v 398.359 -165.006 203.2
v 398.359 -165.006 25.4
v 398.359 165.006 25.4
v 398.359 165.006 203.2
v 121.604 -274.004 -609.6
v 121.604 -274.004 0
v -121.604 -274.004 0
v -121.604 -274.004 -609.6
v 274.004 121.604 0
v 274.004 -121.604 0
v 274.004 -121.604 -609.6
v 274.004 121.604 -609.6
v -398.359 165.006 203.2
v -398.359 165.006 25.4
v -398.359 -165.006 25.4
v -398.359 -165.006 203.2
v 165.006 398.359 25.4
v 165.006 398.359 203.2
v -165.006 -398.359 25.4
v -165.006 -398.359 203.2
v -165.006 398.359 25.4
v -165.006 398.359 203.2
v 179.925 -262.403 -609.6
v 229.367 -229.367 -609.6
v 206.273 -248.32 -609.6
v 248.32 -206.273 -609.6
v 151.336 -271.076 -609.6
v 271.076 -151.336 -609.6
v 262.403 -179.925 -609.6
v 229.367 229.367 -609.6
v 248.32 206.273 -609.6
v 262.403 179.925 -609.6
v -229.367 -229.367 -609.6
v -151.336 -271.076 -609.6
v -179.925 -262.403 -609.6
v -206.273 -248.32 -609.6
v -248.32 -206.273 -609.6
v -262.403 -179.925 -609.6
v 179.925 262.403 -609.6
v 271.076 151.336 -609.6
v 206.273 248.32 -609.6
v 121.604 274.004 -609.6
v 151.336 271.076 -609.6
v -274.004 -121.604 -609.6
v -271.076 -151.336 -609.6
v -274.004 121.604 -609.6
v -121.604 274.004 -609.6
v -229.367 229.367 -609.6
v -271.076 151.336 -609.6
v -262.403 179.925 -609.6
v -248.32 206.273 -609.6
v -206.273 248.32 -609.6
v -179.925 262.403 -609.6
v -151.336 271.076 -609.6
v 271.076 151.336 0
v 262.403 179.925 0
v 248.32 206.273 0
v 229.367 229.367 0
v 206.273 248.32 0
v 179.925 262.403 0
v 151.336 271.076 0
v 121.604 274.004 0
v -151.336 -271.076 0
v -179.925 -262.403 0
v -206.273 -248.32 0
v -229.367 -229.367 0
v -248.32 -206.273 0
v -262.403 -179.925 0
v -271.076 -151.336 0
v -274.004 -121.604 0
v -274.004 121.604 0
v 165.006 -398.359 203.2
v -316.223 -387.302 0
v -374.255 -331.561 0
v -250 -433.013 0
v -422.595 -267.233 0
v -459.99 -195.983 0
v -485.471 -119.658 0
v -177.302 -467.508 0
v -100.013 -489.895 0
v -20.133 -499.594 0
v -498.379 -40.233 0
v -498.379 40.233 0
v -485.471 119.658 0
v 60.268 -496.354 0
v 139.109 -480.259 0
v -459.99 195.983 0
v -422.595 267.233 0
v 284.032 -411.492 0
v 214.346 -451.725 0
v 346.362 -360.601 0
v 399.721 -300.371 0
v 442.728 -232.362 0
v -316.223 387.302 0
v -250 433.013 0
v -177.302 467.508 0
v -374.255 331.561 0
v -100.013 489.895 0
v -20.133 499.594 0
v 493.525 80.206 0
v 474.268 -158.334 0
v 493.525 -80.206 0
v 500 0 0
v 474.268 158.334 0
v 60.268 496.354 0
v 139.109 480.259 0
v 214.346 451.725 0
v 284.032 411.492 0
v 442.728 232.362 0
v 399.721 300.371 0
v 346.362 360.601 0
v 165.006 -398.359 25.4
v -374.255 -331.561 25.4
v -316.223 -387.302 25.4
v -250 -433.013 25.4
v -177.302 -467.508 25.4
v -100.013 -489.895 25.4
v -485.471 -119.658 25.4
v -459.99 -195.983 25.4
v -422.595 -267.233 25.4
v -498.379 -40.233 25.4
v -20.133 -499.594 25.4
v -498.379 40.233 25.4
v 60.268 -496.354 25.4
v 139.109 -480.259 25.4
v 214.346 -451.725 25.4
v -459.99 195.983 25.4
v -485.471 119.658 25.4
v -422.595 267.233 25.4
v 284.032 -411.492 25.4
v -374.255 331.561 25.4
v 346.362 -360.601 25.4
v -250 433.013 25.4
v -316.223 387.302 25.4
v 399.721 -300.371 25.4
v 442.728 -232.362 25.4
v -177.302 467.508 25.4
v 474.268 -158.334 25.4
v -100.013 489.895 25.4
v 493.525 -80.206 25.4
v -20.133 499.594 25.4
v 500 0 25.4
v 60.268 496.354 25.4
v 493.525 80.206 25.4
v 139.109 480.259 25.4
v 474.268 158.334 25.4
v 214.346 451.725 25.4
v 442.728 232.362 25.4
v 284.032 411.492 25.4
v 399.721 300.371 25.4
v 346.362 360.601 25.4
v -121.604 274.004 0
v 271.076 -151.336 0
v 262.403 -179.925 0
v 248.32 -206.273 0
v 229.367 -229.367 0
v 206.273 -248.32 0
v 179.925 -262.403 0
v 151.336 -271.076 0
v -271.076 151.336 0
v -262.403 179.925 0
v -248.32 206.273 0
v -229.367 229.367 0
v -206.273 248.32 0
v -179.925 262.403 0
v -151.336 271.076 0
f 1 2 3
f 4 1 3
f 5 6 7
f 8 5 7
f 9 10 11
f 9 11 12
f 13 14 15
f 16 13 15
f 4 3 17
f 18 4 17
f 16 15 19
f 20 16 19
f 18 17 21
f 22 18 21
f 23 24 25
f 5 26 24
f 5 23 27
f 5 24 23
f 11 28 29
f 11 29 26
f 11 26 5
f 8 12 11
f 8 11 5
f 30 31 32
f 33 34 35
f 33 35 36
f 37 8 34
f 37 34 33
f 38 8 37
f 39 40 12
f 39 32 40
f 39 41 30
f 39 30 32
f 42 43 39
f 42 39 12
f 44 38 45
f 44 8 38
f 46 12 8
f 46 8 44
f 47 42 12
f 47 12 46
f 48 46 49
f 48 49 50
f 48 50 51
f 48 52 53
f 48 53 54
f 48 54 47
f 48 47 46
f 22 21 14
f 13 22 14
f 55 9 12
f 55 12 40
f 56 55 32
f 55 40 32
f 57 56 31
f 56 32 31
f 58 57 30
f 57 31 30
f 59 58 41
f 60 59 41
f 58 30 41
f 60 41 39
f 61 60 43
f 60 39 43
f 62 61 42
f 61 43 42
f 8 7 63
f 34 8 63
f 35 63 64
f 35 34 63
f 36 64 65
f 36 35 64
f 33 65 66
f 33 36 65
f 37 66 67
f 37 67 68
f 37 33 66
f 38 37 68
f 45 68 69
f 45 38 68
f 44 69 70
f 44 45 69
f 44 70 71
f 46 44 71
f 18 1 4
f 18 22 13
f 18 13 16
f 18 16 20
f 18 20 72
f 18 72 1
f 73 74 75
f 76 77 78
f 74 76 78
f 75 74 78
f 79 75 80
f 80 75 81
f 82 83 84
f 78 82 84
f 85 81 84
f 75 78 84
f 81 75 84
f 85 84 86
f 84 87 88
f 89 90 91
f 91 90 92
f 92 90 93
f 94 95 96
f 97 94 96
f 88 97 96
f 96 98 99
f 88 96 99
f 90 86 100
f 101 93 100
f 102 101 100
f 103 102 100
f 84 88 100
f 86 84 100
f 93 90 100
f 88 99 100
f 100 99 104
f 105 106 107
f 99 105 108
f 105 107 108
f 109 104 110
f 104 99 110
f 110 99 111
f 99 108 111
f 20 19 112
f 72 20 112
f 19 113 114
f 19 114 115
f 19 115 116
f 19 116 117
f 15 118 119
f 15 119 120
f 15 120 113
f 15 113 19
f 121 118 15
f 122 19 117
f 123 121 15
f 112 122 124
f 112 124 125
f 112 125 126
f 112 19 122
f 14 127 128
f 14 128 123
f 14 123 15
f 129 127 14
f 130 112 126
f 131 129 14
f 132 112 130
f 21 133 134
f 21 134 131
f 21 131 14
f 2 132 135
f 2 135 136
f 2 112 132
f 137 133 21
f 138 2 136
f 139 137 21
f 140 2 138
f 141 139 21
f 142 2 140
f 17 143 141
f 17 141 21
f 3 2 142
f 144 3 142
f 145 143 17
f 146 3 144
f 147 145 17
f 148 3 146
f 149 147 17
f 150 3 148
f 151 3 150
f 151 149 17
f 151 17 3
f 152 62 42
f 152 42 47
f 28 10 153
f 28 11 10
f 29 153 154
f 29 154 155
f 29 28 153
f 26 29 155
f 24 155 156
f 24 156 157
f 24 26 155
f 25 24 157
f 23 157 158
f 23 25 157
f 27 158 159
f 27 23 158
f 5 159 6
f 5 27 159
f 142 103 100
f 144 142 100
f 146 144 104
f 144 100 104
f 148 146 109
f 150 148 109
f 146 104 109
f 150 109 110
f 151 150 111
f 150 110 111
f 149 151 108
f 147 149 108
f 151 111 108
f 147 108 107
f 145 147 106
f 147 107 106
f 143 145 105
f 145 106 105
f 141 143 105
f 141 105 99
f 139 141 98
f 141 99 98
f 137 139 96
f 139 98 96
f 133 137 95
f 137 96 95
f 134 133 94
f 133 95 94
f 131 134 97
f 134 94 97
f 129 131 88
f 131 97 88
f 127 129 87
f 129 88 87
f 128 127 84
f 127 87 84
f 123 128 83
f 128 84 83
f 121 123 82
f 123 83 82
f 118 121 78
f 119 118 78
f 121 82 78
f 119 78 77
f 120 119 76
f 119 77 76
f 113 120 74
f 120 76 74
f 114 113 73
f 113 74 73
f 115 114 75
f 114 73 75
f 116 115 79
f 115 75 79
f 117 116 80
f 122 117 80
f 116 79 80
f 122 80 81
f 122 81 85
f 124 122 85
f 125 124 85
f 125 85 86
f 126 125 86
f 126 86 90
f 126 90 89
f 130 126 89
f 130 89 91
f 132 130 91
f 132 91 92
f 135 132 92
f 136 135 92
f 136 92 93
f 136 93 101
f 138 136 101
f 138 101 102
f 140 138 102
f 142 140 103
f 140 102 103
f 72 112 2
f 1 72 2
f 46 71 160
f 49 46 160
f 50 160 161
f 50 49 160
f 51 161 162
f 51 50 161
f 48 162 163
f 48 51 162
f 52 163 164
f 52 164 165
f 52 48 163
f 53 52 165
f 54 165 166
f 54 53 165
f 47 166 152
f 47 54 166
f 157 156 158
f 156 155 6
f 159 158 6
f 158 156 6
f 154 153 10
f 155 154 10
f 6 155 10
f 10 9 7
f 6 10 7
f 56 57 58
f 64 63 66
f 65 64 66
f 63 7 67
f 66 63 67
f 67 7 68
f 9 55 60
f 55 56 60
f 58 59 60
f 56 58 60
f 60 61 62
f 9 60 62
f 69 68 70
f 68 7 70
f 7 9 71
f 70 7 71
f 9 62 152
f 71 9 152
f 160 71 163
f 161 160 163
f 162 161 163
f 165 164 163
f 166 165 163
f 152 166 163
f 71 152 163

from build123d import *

# Parameters (mm, degrees)
BOSS_EXTRUDE1_DEPTH = 203.2
SKETCH1_3_R         = 500
BOSS_EXTRUDE2_DEPTH = 25.4
SKETCH2_W           = 548.008149558
SKETCH2_H           = 548.008149558
BOSS_EXTRUDE3_DEPTH = 609.6
FILLET1_R           = 152.4


with BuildPart() as part:
    # Sketch1 → Boss-Extrude1 (new body)
    with BuildSketch(Plane.XY):
        Polygon((398.358671467, -165.005564411), (398.358671467, 165.005564411), (165.005564411, 398.358671467), (-165.005564411, 398.358671467), (-398.358671467, 165.005564411), (-398.358671467, -165.005564411), (-165.005564411, -398.358671467), (165.005564411, -398.358671467), align=None)
    extrude(amount=BOSS_EXTRUDE1_DEPTH)

    # Sketch1<3> → Boss-Extrude2 (add)
    with BuildSketch(Plane.XY):
        Circle(SKETCH1_3_R)
        Polygon((165.005564411, 398.358671467), (-165.005564411, 398.358671467), (-398.358671467, 165.005564411), (-398.358671467, -165.005564411), (-165.005564411, -398.358671467), (165.005564411, -398.358671467), (398.358671467, -165.005564411), (398.358671467, 165.005564411), align=None, mode=Mode.SUBTRACT)
    extrude(amount=BOSS_EXTRUDE2_DEPTH)


with BuildPart() as body_2:
    # Sketch2 → Boss-Extrude3 (new body)
    with BuildSketch(Plane(origin=(0, 0, 0), x_dir=(-1, 0, 0), z_dir=(0, 0, -1))):
        Rectangle(SKETCH2_W, SKETCH2_H)
    extrude(amount=BOSS_EXTRUDE3_DEPTH)

    # Fillet1
    fillet1_edges = [body_2.edges().sort_by_distance(p)[0] for p in [
        (274.004074779, 274.004074779, -304.8),
        (-274.004074779, 274.004074779, -304.8),
        (-274.004074779, -274.004074779, -304.8),
        (274.004074779, -274.004074779, -304.8),
    ]]
    fillet(fillet1_edges, radius=FILLET1_R)


solid = Compound([part.part, body_2.part])
